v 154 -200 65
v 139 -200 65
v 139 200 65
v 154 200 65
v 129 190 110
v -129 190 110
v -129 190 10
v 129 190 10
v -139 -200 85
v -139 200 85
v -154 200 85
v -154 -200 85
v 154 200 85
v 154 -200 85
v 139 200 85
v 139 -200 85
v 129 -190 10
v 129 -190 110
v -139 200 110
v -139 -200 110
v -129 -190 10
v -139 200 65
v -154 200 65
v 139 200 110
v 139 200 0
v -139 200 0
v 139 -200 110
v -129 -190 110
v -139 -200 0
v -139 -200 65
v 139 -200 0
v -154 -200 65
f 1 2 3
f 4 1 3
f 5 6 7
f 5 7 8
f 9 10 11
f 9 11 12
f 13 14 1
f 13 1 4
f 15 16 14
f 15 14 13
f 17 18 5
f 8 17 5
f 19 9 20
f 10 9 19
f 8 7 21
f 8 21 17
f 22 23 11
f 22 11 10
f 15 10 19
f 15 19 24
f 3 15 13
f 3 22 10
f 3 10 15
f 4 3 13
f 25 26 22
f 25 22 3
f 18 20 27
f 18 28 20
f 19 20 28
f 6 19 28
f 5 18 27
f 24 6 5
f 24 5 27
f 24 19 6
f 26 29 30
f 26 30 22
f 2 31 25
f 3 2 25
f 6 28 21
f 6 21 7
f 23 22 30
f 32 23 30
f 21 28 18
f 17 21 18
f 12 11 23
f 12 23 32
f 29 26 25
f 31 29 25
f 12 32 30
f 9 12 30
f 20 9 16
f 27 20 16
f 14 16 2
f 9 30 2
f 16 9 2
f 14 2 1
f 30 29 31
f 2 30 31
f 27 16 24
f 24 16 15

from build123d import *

# Parameters (mm, degrees)
F0_W     = 278
F0_H     = 400
F1_DEPTH = 110
F2_W     = 258
F2_H     = 380
F3_DEPTH = 100
F4_W     = 400
F4_H     = 20
F5_DEPTH = 15
F6_W     = 400
F6_H     = 20
F7_DEPTH = 15


with BuildPart() as f1:
    # F0 (on Top) → F1 (new body)
    with BuildSketch(Plane.XY):
        Rectangle(F0_W, F0_H)
    extrude(amount=F1_DEPTH)

    # F2 (on face) → F3 (cut)
    with BuildSketch(Plane.XY.offset(110)):
        Rectangle(F2_W, F2_H)
    extrude(amount=-F3_DEPTH, mode=Mode.SUBTRACT)

    # F4 (on face) → F5 (join)
    with BuildSketch(Plane(origin=(-139, 0, 0), x_dir=(0, -1, 0), z_dir=(-1, 0, 0))):
        with Locations((0, 75)):
            Rectangle(F4_W, F4_H)
    extrude(amount=F5_DEPTH)

    # F6 (on face) → F7 (join)
    with BuildSketch(Plane.YZ.offset(139)):
        with Locations((0, 75)):
            Rectangle(F6_W, F6_H)
    extrude(amount=F7_DEPTH)


solid = f1.part
